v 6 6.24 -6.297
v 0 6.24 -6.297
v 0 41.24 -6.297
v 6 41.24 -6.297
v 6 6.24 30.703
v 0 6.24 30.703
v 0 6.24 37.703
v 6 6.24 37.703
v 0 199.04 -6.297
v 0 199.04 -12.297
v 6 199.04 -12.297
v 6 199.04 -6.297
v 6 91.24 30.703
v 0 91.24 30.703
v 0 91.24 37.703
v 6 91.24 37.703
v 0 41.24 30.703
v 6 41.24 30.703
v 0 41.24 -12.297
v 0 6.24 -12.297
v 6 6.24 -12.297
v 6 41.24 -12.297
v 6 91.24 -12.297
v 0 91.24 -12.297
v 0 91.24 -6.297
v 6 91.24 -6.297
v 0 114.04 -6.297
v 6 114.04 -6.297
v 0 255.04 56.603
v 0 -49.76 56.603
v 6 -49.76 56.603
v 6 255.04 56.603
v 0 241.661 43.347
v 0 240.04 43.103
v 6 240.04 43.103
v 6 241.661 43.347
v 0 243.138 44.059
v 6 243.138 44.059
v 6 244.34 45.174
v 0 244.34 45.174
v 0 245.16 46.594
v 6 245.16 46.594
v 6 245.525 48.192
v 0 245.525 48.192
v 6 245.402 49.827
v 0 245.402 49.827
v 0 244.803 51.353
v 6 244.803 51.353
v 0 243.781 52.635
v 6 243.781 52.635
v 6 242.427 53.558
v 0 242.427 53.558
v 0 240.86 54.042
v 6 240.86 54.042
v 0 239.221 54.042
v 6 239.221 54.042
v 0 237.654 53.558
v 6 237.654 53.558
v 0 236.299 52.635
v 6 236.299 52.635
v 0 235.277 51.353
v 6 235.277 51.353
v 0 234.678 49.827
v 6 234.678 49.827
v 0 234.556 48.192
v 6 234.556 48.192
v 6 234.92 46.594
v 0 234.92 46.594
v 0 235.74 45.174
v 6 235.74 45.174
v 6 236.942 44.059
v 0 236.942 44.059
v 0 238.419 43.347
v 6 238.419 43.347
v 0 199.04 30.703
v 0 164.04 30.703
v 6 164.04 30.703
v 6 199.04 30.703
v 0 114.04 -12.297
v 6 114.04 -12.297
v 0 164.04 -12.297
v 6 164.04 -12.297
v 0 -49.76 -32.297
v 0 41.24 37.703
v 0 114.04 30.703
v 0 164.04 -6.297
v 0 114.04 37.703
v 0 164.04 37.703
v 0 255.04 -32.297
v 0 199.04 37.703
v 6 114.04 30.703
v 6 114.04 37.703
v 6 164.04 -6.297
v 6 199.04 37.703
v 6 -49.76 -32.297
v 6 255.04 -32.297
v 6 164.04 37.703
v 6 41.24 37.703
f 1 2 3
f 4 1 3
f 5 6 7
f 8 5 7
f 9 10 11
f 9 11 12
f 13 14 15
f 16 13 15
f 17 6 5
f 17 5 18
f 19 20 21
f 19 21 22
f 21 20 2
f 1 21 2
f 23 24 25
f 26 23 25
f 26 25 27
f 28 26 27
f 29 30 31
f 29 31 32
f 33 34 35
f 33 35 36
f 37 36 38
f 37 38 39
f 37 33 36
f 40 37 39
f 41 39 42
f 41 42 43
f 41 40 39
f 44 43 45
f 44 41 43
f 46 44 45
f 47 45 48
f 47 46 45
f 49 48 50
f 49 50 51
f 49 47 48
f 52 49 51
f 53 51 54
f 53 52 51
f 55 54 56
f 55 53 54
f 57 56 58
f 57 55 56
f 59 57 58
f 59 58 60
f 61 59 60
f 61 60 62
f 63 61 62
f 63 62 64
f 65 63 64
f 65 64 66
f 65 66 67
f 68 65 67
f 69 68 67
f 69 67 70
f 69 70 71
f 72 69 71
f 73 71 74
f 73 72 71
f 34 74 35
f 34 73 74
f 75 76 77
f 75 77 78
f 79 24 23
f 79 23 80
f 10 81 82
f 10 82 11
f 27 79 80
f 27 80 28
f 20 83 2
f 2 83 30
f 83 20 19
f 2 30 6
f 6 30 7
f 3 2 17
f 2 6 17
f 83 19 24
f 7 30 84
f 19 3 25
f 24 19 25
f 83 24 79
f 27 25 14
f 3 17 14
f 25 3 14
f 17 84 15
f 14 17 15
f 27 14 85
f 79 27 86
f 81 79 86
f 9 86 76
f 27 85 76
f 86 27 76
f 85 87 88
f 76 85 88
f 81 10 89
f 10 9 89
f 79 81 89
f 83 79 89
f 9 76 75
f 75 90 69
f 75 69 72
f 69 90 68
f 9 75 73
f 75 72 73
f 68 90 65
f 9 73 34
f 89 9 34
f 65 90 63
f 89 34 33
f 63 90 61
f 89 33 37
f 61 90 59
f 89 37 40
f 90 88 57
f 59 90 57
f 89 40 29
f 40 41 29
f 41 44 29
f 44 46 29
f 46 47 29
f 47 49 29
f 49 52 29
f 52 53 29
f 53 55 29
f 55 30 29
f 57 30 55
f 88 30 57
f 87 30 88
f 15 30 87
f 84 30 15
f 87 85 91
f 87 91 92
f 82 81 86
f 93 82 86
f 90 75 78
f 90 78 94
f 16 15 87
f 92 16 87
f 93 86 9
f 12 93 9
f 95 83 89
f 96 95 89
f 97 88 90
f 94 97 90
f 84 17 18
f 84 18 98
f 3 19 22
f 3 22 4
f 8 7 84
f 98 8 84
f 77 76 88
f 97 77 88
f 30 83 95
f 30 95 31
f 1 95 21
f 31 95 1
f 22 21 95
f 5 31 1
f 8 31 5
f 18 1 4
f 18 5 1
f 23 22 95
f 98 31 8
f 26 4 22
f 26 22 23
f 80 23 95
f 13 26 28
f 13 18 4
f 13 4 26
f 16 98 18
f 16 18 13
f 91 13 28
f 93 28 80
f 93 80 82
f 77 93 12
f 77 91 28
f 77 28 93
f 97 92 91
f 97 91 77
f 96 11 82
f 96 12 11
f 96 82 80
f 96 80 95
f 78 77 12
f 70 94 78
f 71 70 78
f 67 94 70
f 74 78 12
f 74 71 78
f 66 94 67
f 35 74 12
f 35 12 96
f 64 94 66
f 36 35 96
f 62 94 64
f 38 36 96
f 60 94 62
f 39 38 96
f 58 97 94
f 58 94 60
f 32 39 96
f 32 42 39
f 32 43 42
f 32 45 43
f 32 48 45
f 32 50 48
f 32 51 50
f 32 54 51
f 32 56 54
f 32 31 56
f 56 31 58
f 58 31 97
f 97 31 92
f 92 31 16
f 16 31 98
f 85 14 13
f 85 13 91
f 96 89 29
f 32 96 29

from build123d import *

# Parameters (mm, degrees)
SKETCH1_W           = 304.8
SKETCH1_H           = 88.9
SKETCH1_R           = 5.5
SKETCH1_W_2         = 35
SKETCH1_H_2         = 6
SKETCH1_W_3         = 22.8
SKETCH1_H_3         = 7
BOSS_EXTRUDE1_DEPTH = 6


with BuildPart() as part:
    # Sketch1 → Boss-Extrude1 (new body)
    with BuildSketch(Plane.YZ):
        with Locations((102.640236686, 12.152975526)):
            Rectangle(SKETCH1_W, SKETCH1_H)
        with Locations(Location((240.040236686, 48.602975526, 0), (0, 0, 270))):
            Circle(SKETCH1_R, mode=Mode.SUBTRACT)
        with Locations((23.740236686, -9.297024474)):
            Rectangle(SKETCH1_W_2, SKETCH1_H_2, mode=Mode.SUBTRACT)
        with Locations((102.640236686, -9.297024474)):
            Rectangle(SKETCH1_W_3, SKETCH1_H_2, mode=Mode.SUBTRACT)
        with Locations((181.540236686, -9.297024474)):
            Rectangle(SKETCH1_W_2, SKETCH1_H_2, mode=Mode.SUBTRACT)
        with Locations((23.740236686, 34.202975526)):
            Rectangle(SKETCH1_W_2, SKETCH1_H_3, mode=Mode.SUBTRACT)
        with Locations((102.640236686, 34.202975526)):
            Rectangle(SKETCH1_W_3, SKETCH1_H_3, mode=Mode.SUBTRACT)
        with Locations((181.540236686, 34.202975526)):
            Rectangle(SKETCH1_W_2, SKETCH1_H_3, mode=Mode.SUBTRACT)
    extrude(amount=BOSS_EXTRUDE1_DEPTH)


solid = part.part
